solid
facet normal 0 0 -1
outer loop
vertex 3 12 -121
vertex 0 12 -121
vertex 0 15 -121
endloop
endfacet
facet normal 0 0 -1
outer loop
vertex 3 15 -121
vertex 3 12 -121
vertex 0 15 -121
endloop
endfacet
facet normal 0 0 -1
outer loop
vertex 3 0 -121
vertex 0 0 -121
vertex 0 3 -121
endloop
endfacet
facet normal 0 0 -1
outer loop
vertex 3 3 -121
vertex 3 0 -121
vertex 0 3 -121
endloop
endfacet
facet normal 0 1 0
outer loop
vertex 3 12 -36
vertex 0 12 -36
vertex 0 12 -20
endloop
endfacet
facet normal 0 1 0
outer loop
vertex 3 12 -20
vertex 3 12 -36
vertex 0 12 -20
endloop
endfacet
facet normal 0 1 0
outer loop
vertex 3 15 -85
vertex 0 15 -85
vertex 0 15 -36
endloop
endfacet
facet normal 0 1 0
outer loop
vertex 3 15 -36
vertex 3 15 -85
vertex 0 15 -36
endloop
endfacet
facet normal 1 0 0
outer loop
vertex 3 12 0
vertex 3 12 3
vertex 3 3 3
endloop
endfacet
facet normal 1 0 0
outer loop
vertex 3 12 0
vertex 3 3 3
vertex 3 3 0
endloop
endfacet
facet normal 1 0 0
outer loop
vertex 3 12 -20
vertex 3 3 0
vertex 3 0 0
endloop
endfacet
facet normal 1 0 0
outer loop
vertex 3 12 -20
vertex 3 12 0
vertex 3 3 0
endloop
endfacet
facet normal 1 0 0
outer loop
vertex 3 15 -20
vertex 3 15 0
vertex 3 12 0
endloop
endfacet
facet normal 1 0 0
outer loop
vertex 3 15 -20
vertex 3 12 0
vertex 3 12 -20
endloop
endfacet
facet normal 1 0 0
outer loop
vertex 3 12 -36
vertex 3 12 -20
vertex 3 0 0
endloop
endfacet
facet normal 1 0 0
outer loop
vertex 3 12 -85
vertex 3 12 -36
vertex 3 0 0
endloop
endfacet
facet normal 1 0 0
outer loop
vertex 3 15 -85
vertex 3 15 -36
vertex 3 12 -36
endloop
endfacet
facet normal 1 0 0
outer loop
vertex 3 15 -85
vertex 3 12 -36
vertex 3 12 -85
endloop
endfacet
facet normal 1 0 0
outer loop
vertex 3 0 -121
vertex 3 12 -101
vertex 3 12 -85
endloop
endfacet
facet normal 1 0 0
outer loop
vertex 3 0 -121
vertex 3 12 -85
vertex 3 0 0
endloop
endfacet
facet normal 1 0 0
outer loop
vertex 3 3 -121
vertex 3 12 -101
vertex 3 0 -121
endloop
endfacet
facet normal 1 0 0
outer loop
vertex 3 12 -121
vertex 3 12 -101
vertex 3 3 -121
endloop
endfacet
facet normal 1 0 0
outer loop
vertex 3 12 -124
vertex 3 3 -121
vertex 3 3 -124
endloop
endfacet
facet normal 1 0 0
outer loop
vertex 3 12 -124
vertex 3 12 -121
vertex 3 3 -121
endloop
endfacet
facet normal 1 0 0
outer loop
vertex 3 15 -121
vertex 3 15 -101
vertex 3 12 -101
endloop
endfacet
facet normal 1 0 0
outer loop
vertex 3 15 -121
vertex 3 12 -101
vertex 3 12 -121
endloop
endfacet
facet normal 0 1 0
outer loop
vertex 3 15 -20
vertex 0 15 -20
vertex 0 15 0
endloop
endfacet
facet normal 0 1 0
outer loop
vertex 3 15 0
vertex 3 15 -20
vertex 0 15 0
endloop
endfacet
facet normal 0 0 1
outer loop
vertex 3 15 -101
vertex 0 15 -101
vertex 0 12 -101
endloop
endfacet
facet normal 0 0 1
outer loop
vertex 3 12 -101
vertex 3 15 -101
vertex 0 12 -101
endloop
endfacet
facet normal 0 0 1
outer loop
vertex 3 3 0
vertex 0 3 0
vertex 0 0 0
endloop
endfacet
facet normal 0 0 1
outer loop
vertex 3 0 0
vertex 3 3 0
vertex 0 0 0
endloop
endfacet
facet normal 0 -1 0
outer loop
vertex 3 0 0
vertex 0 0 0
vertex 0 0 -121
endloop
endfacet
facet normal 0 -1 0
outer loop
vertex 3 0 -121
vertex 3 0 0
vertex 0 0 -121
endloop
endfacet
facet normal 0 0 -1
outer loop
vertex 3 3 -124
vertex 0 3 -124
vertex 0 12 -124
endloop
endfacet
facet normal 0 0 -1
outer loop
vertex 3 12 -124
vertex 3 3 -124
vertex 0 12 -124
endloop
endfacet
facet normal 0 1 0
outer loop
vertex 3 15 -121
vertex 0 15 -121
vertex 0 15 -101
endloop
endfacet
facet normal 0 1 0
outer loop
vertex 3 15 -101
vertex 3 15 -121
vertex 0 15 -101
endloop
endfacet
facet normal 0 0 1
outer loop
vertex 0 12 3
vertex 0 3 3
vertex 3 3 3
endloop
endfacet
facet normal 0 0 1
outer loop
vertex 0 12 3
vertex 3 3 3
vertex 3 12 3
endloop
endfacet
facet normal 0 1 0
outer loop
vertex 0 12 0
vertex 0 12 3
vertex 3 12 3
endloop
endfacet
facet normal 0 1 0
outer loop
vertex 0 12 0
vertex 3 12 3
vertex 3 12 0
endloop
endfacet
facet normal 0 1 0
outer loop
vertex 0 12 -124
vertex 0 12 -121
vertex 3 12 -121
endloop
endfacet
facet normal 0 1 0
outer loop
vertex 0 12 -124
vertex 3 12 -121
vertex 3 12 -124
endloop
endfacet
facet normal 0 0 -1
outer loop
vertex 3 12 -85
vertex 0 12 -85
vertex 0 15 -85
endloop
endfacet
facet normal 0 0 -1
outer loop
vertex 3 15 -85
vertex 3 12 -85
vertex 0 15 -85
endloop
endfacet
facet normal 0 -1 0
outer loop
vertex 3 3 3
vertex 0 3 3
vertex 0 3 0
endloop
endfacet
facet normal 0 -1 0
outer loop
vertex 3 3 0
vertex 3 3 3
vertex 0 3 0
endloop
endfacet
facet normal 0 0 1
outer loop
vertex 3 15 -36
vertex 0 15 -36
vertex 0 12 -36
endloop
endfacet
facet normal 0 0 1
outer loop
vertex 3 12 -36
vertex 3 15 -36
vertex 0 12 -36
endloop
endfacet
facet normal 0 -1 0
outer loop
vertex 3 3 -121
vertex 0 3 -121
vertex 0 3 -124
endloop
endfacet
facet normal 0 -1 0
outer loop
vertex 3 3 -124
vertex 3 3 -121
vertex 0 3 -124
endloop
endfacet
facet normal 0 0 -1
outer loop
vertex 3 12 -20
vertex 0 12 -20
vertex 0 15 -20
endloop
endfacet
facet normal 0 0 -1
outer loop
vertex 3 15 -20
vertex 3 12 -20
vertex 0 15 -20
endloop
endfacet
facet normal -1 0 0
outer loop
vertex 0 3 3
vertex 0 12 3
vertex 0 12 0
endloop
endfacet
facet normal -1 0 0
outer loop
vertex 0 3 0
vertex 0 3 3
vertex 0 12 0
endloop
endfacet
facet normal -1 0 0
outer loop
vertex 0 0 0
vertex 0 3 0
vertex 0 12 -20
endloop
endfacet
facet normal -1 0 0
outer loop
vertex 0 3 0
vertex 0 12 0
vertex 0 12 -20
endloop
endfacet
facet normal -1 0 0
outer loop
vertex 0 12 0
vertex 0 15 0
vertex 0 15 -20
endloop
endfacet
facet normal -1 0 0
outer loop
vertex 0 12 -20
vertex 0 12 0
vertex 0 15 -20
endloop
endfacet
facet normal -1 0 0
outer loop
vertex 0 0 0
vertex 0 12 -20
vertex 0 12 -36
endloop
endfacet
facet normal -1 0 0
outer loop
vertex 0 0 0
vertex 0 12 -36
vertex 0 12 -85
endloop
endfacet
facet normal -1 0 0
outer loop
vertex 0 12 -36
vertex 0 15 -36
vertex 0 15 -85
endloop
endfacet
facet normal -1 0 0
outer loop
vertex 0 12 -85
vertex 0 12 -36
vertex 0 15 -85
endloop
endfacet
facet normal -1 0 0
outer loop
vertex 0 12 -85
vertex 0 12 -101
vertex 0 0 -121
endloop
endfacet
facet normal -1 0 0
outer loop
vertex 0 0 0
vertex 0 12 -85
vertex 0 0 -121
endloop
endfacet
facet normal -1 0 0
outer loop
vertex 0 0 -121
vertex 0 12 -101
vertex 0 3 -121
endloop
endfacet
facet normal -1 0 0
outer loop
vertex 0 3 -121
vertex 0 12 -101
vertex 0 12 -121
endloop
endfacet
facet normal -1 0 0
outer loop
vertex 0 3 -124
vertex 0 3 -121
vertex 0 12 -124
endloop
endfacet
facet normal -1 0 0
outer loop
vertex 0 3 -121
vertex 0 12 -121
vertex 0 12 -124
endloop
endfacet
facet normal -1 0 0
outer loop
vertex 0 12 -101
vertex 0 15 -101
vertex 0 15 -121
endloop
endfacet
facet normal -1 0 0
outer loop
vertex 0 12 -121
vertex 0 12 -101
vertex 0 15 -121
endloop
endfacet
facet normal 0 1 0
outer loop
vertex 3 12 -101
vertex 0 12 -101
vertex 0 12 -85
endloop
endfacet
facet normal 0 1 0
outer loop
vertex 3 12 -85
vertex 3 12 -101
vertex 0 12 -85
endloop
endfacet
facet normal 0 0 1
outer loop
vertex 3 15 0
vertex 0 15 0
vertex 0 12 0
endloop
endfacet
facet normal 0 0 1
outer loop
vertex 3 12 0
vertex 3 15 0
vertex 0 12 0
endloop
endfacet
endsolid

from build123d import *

# Parameters (mm, degrees)
SKETCH1_W           = 3
SKETCH1_H           = 9
BOSS_EXTRUDE1_DEPTH = 3


with BuildPart() as part:
    # Sketch1 → Boss-Extrude1 (new body)
    with BuildSketch(Plane(origin=(0, 0, 0), x_dir=(0, 0, -1), z_dir=(1, 0, 0))):
        Polygon((0, 3), (0, 0), (121, 0), (121, 3), (121, 12), (121, 15), (101, 15), (101, 12), (85, 12), (85, 15), (36, 15), (36, 12), (20, 12), (20, 15), (0, 15), (0, 12), align=None)
        with Locations((-1.5, 7.5)):
            Rectangle(SKETCH1_W, SKETCH1_H)
        with Locations((122.5, 7.5)):
            Rectangle(SKETCH1_W, SKETCH1_H)
    extrude(amount=BOSS_EXTRUDE1_DEPTH)


solid = part.part
